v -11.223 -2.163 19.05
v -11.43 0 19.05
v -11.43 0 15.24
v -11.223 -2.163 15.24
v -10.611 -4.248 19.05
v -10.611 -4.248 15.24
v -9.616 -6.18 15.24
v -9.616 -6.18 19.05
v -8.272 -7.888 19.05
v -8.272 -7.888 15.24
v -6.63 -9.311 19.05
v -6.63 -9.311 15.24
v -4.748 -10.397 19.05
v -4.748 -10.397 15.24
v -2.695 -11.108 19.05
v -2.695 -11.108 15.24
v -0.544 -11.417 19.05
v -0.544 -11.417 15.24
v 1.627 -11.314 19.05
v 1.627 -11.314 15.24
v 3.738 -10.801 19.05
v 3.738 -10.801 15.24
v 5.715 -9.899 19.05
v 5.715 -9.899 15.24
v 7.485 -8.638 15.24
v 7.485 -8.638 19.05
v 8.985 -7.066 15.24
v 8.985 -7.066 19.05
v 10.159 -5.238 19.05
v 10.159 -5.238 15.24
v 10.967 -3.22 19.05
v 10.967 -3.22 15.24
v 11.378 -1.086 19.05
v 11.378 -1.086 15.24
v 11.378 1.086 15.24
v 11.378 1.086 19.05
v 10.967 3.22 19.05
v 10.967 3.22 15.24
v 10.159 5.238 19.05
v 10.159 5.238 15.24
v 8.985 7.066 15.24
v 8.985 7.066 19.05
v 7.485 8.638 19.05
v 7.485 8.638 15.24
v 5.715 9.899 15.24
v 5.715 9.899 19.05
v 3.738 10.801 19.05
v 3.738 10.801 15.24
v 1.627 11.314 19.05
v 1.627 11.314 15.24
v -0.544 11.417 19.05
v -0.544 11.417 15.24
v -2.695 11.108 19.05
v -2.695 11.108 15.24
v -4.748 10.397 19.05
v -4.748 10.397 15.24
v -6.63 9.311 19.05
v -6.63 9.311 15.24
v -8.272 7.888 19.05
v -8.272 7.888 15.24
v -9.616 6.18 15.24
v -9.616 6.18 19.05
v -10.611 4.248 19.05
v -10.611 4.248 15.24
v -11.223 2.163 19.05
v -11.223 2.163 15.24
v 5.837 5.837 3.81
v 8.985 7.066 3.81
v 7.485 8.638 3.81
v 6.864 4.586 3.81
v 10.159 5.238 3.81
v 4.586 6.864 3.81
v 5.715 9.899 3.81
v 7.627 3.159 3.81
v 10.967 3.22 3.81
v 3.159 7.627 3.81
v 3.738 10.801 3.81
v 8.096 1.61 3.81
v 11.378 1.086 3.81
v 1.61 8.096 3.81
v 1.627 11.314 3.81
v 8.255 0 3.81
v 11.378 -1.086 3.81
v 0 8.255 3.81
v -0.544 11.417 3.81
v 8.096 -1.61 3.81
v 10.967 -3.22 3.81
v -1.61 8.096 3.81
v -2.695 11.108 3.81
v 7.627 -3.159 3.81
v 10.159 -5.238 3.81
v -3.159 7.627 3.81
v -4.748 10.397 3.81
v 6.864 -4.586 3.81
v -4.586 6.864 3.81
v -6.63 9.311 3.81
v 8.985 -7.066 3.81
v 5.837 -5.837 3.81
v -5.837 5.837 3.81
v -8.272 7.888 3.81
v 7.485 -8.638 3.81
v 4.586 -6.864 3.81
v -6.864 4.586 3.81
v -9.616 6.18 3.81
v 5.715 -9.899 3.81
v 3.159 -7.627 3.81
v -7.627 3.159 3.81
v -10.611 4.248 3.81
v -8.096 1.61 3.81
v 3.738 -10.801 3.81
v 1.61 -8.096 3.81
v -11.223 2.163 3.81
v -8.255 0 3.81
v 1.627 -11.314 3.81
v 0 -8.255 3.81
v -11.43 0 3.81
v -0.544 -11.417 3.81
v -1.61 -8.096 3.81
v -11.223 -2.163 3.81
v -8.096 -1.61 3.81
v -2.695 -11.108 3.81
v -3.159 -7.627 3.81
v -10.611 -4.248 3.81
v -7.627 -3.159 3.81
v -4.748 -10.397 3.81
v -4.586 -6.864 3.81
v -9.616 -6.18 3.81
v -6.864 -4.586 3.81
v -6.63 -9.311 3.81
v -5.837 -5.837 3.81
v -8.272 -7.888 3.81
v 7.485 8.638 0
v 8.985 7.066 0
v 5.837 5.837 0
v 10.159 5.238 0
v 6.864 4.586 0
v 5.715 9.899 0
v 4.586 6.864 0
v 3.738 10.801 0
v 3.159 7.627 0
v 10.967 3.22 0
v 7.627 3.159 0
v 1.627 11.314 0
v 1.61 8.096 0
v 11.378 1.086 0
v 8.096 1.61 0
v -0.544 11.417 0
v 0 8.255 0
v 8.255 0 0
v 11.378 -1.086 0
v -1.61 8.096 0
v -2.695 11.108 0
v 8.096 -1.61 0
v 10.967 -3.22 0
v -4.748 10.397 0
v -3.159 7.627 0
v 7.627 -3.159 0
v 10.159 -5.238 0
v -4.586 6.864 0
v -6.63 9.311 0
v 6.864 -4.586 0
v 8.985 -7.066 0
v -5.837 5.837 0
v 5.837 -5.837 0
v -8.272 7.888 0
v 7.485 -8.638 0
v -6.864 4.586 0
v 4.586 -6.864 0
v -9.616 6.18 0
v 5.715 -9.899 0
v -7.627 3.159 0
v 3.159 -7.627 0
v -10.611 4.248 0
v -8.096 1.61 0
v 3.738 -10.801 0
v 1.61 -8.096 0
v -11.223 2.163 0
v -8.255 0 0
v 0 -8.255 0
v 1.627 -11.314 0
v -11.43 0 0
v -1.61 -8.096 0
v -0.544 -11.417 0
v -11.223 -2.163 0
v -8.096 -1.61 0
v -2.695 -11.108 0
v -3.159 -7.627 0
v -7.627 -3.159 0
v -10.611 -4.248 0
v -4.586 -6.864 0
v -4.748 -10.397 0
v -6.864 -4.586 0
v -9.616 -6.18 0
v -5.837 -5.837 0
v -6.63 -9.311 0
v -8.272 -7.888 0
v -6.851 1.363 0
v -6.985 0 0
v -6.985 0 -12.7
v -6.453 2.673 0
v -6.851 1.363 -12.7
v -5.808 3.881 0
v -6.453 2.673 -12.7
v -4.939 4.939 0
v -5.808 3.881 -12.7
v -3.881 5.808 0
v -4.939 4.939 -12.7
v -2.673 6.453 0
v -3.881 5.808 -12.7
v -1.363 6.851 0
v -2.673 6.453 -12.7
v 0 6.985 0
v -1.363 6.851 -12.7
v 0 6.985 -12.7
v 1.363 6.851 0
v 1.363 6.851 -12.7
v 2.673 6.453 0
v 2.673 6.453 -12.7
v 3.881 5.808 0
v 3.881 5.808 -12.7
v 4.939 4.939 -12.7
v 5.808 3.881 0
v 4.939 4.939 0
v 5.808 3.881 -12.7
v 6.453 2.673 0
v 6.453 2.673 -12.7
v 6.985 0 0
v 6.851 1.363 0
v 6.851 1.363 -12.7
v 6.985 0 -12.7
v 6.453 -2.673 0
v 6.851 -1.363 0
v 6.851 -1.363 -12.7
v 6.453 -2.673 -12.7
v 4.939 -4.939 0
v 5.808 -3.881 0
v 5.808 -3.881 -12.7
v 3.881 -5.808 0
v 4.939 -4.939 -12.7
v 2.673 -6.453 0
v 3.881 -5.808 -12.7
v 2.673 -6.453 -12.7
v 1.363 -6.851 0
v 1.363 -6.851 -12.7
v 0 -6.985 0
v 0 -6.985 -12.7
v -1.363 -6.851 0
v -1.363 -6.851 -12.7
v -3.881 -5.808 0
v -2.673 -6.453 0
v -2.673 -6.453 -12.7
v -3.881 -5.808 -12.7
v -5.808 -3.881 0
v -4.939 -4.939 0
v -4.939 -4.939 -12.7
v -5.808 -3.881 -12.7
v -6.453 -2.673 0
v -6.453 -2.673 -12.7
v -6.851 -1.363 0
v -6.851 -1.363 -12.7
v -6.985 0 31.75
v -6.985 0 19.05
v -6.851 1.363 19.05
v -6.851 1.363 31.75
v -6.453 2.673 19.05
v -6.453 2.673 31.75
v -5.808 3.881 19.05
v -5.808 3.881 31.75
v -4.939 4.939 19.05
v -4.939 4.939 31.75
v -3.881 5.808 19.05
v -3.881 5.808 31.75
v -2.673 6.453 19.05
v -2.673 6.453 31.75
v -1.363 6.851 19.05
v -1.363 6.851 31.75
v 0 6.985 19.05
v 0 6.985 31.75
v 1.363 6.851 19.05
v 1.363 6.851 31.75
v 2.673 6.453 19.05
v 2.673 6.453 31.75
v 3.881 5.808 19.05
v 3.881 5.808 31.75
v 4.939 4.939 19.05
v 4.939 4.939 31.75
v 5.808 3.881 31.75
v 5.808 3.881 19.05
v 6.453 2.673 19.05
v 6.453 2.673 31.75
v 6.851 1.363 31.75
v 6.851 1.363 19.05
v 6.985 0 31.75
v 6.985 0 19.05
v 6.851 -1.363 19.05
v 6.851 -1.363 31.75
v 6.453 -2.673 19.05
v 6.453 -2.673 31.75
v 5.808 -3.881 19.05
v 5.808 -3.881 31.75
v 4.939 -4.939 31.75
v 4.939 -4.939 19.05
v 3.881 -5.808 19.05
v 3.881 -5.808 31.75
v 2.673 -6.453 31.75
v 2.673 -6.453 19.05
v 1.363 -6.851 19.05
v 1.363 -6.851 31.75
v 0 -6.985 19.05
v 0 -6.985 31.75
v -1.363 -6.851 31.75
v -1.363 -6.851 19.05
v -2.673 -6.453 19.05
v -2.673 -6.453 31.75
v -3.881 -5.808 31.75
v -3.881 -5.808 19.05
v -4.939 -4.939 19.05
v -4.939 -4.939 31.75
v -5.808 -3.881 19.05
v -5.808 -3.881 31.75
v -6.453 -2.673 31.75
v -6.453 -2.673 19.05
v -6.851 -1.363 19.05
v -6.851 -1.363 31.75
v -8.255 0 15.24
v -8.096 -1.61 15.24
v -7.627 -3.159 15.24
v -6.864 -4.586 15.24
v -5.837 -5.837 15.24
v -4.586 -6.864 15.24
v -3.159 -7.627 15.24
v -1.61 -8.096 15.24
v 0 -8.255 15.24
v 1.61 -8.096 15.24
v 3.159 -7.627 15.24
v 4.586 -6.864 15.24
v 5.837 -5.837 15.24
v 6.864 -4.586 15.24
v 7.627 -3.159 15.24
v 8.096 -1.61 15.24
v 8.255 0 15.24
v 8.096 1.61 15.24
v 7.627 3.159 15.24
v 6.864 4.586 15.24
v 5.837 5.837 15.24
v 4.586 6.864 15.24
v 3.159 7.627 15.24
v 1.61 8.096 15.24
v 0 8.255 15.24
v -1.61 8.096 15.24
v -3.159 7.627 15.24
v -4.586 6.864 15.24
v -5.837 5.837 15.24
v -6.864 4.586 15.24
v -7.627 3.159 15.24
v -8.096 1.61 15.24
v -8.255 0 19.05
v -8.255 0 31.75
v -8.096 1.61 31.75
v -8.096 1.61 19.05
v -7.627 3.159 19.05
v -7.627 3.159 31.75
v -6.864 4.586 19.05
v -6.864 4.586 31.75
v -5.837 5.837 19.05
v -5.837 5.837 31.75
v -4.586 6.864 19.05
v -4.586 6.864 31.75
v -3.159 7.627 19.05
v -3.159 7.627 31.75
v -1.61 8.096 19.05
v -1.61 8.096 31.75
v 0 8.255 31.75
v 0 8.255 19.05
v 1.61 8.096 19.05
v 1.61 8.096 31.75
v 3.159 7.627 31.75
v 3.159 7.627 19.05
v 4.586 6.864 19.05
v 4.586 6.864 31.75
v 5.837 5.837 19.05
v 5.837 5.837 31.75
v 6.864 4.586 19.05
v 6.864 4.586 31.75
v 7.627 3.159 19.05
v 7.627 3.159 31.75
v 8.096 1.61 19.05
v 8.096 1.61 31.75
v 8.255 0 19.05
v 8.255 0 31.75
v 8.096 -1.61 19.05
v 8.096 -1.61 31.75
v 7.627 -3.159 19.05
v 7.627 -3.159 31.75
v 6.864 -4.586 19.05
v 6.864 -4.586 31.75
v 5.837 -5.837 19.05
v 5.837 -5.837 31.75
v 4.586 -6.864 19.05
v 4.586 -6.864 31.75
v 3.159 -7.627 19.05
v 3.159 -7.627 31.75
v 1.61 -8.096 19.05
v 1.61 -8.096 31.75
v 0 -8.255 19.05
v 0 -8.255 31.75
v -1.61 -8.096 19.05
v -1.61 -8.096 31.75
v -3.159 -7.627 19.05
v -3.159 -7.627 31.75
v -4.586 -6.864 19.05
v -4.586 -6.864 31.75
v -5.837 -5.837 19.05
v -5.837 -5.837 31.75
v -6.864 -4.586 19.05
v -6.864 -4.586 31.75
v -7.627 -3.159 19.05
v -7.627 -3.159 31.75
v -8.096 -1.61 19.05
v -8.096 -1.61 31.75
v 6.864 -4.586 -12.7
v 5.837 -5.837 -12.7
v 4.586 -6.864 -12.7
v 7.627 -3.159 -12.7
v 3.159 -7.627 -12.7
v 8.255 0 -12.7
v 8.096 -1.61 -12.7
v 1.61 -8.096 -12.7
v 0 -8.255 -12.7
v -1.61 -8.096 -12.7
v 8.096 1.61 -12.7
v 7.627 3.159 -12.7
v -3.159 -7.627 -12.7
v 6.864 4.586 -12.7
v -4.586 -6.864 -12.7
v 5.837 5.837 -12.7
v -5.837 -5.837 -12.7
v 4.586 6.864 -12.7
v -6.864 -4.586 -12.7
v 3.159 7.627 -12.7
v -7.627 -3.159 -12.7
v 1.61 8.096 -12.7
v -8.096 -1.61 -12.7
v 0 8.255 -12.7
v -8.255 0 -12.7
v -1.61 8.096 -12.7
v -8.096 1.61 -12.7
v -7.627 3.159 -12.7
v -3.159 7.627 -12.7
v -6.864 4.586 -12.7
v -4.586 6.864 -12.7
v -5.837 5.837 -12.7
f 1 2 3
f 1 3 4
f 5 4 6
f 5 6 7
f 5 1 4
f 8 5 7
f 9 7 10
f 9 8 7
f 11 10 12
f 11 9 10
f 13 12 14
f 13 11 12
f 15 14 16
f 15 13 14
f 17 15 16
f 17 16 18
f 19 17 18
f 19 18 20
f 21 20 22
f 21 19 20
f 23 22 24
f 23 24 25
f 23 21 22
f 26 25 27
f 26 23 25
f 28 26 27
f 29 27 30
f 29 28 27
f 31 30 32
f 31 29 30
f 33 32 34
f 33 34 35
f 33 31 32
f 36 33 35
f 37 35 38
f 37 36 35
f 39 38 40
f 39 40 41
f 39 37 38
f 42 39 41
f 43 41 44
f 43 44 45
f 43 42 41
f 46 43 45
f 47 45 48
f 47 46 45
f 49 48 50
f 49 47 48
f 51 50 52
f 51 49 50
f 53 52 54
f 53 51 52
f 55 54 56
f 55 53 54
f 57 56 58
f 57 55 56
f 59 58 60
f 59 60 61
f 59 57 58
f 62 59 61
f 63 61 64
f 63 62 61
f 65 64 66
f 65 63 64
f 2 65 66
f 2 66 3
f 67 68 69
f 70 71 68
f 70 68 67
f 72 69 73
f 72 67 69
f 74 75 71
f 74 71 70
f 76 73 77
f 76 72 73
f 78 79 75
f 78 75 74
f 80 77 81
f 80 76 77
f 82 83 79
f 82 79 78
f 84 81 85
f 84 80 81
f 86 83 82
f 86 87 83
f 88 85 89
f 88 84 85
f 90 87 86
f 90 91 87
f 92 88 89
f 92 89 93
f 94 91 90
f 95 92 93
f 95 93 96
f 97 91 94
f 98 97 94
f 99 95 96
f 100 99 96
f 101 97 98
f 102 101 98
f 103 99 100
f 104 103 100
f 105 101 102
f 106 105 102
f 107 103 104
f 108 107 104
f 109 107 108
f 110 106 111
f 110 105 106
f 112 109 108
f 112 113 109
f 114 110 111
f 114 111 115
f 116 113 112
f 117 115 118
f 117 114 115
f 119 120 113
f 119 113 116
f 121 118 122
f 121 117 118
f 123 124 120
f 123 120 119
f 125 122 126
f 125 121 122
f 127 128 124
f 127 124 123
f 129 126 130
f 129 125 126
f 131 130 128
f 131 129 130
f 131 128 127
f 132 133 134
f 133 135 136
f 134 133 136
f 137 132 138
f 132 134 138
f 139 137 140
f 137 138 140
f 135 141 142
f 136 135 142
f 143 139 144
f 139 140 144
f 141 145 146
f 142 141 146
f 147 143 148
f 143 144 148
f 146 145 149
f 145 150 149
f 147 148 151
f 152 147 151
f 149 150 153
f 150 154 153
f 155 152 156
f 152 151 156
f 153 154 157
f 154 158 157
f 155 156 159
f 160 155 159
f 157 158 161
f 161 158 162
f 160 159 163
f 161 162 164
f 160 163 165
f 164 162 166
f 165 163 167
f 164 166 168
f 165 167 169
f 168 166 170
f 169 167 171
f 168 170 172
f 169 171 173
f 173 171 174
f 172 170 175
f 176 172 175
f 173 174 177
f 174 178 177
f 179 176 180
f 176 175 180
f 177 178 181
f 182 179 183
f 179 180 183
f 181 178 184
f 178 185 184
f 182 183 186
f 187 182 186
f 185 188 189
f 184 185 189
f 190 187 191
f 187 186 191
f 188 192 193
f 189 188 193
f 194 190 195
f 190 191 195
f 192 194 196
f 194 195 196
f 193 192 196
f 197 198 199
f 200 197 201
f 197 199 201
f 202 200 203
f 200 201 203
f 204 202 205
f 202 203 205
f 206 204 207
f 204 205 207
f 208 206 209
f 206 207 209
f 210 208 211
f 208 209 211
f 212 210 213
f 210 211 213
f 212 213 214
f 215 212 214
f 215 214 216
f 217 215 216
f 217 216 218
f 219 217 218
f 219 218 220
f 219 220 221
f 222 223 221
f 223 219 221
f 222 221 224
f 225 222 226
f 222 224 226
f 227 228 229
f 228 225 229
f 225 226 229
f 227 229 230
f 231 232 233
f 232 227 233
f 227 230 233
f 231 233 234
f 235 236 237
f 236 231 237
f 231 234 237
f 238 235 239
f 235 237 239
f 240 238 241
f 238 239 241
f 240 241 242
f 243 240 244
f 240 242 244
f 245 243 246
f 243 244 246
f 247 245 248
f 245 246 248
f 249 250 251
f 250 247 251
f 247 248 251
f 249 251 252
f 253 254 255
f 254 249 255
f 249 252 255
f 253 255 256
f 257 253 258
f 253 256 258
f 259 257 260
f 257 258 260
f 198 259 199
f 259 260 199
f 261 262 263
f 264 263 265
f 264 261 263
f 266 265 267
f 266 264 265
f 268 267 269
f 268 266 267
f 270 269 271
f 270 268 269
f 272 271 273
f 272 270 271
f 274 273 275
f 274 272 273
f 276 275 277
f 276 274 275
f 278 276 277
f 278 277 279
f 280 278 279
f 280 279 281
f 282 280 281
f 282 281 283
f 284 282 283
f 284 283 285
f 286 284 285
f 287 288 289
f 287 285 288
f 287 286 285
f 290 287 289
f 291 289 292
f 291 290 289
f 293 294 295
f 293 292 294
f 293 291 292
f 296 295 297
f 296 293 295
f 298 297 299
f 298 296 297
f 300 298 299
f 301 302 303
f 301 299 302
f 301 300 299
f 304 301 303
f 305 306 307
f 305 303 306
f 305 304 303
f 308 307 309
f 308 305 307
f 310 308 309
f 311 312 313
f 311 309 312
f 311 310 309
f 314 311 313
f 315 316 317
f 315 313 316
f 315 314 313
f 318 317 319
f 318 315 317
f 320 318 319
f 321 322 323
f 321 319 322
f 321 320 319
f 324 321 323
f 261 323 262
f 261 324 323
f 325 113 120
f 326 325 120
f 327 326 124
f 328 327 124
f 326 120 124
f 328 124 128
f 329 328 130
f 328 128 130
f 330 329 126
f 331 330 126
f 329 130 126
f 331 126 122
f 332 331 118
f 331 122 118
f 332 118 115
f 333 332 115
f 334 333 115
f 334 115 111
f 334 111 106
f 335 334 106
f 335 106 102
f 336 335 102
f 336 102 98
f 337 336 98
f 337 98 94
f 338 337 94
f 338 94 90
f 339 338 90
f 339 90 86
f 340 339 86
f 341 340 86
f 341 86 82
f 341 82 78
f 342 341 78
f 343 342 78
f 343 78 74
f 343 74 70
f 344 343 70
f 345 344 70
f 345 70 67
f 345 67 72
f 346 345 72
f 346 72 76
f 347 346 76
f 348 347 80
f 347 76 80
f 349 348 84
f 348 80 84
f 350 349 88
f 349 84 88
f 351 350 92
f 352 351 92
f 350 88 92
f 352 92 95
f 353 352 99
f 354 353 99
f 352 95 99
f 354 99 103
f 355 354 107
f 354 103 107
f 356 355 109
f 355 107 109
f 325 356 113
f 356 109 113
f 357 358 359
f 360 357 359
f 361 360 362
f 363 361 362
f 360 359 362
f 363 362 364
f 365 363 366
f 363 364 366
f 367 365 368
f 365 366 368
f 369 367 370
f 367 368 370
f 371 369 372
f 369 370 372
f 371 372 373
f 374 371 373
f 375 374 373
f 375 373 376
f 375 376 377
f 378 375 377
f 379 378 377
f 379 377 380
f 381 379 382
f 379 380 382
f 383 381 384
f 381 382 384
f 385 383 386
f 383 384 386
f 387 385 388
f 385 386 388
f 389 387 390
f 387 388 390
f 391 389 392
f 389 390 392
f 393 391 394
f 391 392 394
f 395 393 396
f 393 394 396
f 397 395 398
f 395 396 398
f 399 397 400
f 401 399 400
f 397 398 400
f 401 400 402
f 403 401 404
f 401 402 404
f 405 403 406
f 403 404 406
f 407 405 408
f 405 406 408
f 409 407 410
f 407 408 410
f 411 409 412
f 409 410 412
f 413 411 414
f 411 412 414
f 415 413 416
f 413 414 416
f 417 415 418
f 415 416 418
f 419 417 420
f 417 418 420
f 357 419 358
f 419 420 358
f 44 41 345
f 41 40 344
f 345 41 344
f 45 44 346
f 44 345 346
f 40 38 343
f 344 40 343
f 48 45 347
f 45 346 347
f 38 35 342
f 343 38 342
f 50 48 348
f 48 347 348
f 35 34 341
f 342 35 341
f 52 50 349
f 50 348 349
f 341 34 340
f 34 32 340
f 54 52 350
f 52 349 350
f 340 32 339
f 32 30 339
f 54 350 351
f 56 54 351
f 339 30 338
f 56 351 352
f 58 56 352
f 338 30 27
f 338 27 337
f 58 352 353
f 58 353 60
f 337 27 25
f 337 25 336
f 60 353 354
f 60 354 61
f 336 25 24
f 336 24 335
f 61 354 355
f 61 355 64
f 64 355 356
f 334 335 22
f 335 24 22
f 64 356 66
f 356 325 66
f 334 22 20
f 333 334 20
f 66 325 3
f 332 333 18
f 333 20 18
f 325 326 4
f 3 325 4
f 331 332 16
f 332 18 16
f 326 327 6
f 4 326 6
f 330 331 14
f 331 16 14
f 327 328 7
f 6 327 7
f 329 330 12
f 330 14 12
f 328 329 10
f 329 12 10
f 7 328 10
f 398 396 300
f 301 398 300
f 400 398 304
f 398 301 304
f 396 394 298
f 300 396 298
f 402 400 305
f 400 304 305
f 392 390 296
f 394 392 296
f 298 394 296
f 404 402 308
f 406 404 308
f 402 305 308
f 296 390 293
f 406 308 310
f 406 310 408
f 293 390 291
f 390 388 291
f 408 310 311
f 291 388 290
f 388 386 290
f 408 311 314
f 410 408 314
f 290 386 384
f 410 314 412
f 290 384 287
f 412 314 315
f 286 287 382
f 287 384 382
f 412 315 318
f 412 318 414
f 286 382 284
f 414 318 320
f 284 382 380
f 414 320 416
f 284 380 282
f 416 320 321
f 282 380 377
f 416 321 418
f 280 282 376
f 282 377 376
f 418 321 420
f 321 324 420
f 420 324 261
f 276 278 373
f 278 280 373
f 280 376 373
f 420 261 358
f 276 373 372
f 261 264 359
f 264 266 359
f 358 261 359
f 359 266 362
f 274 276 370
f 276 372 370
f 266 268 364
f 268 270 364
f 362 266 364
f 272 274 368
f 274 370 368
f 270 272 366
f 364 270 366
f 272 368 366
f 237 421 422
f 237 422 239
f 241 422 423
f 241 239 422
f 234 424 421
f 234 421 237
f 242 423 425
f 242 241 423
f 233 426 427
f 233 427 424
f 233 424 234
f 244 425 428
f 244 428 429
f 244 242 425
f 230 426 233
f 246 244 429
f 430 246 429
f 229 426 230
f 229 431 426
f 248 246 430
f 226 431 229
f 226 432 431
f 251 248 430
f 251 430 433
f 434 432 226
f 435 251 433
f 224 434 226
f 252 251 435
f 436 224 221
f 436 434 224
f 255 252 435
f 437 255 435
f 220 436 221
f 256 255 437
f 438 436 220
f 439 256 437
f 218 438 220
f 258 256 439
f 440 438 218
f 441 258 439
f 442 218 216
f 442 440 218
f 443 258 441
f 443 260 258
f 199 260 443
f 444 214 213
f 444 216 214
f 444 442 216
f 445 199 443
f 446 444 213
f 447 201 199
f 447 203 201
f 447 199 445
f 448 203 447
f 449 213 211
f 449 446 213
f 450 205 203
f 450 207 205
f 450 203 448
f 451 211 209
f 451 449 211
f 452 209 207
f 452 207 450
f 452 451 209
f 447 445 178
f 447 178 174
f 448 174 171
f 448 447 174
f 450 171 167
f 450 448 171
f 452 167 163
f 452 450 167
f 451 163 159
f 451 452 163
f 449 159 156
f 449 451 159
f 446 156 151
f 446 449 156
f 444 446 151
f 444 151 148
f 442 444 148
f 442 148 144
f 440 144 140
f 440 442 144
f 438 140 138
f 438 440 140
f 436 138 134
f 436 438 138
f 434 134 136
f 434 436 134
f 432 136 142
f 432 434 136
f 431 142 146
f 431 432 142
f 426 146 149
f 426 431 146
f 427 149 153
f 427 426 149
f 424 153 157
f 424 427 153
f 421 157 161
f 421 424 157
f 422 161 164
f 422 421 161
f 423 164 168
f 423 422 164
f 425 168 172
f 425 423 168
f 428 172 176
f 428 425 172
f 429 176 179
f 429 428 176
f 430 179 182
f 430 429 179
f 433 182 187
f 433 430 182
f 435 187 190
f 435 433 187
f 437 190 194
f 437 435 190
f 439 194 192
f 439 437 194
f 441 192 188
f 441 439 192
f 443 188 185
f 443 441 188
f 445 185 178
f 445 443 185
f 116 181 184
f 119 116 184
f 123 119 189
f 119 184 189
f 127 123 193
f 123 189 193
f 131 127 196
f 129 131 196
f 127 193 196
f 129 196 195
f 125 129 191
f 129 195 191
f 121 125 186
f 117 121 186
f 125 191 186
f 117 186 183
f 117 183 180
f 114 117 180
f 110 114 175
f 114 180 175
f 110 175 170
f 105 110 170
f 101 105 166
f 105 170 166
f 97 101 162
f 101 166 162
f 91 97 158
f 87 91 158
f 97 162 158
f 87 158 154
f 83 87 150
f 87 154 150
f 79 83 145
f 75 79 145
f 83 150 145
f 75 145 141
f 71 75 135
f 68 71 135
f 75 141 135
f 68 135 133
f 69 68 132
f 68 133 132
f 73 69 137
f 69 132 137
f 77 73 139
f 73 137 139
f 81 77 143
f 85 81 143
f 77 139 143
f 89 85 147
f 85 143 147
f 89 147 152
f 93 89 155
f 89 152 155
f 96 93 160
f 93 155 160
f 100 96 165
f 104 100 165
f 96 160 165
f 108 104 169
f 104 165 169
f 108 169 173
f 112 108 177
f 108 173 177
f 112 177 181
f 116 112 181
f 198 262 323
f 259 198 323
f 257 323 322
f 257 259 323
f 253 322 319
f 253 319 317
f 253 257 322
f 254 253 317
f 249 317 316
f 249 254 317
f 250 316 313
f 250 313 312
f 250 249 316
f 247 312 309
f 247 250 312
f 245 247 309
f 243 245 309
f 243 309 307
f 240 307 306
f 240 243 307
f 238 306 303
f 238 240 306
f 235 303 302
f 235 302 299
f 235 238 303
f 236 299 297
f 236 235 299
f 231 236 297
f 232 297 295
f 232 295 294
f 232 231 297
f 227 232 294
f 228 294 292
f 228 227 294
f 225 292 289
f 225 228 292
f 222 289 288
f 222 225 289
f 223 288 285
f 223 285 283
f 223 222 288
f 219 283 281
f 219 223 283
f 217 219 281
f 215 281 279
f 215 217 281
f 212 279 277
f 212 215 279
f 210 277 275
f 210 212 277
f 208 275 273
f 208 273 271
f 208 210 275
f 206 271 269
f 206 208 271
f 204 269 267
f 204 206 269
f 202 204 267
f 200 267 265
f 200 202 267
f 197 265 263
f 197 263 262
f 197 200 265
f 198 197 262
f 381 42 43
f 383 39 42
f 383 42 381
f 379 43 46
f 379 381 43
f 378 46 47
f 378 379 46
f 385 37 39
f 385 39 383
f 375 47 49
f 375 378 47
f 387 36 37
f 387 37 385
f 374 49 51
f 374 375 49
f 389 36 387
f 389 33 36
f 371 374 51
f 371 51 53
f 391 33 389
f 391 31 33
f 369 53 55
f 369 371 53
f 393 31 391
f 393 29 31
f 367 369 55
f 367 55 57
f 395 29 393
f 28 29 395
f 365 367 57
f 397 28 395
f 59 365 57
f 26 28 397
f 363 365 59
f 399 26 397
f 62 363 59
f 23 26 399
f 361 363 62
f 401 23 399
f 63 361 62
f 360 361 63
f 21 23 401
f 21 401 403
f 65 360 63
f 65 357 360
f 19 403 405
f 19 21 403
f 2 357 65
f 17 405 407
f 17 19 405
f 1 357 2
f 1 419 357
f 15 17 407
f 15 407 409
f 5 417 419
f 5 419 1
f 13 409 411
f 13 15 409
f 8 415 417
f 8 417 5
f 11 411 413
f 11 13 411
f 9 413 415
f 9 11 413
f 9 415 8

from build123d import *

# Parameters (mm, degrees)
SKETCH1_R           = 8.255
SKETCH1_R_2         = 6.985
BOSS_EXTRUDE1_DEPTH = 19.05
SKETCH2_R           = 11.43
SKETCH2_R_2         = 8.255
BOSS_EXTRUDE2_DEPTH = 3.81
BOSS_EXTRUDE3_START = 12.7
SKETCH3_R           = 8.255
SKETCH3_R_2         = 6.985
BOSS_EXTRUDE3_DEPTH = 12.7


with BuildPart() as part:
    # Sketch1 → Boss-Extrude1 (new body)
    with BuildSketch(Plane.XY):
        with Locations(Location((0, 0, 0), (0, 0, 180))):
            Circle(SKETCH1_R)
        with Locations(Location((0, 0, 0), (0, 0, 180))):
            Circle(SKETCH1_R_2, mode=Mode.SUBTRACT)
    extrude(amount=BOSS_EXTRUDE1_DEPTH)

    # Sketch2 → Boss-Extrude2 (add)
    with BuildSketch(Plane.XY):
        with Locations(Location((0, 0, 0), (0, 0, 180))):
            Circle(SKETCH2_R)
        with Locations(Location((0, 0, 0), (0, 0, 180))):
            Circle(SKETCH2_R_2, mode=Mode.SUBTRACT)
    boss_extrude2 = extrude(amount=BOSS_EXTRUDE2_DEPTH)

    # Sketch3 → Boss-Extrude3 (add)
    with BuildSketch(Plane(origin=(0, 0, 0), x_dir=(-1, 0, 0), z_dir=(0, 0, -1)).offset(BOSS_EXTRUDE3_START)):
        Circle(SKETCH3_R)
        Circle(SKETCH3_R_2, mode=Mode.SUBTRACT)
    boss_extrude3 = extrude(amount=-BOSS_EXTRUDE3_DEPTH)

    # Mirror1: Boss-Extrude2 across plane
    add(boss_extrude2.mirror(Plane(origin=(0, 0, 9.525), x_dir=(1, 0, 0), z_dir=(0, 0, -1))))

    # Mirror2: Boss-Extrude3 across plane
    add(boss_extrude3.mirror(Plane(origin=(0, 0, 9.525), x_dir=(1, 0, 0), z_dir=(0, 0, -1))))


solid = part.part
